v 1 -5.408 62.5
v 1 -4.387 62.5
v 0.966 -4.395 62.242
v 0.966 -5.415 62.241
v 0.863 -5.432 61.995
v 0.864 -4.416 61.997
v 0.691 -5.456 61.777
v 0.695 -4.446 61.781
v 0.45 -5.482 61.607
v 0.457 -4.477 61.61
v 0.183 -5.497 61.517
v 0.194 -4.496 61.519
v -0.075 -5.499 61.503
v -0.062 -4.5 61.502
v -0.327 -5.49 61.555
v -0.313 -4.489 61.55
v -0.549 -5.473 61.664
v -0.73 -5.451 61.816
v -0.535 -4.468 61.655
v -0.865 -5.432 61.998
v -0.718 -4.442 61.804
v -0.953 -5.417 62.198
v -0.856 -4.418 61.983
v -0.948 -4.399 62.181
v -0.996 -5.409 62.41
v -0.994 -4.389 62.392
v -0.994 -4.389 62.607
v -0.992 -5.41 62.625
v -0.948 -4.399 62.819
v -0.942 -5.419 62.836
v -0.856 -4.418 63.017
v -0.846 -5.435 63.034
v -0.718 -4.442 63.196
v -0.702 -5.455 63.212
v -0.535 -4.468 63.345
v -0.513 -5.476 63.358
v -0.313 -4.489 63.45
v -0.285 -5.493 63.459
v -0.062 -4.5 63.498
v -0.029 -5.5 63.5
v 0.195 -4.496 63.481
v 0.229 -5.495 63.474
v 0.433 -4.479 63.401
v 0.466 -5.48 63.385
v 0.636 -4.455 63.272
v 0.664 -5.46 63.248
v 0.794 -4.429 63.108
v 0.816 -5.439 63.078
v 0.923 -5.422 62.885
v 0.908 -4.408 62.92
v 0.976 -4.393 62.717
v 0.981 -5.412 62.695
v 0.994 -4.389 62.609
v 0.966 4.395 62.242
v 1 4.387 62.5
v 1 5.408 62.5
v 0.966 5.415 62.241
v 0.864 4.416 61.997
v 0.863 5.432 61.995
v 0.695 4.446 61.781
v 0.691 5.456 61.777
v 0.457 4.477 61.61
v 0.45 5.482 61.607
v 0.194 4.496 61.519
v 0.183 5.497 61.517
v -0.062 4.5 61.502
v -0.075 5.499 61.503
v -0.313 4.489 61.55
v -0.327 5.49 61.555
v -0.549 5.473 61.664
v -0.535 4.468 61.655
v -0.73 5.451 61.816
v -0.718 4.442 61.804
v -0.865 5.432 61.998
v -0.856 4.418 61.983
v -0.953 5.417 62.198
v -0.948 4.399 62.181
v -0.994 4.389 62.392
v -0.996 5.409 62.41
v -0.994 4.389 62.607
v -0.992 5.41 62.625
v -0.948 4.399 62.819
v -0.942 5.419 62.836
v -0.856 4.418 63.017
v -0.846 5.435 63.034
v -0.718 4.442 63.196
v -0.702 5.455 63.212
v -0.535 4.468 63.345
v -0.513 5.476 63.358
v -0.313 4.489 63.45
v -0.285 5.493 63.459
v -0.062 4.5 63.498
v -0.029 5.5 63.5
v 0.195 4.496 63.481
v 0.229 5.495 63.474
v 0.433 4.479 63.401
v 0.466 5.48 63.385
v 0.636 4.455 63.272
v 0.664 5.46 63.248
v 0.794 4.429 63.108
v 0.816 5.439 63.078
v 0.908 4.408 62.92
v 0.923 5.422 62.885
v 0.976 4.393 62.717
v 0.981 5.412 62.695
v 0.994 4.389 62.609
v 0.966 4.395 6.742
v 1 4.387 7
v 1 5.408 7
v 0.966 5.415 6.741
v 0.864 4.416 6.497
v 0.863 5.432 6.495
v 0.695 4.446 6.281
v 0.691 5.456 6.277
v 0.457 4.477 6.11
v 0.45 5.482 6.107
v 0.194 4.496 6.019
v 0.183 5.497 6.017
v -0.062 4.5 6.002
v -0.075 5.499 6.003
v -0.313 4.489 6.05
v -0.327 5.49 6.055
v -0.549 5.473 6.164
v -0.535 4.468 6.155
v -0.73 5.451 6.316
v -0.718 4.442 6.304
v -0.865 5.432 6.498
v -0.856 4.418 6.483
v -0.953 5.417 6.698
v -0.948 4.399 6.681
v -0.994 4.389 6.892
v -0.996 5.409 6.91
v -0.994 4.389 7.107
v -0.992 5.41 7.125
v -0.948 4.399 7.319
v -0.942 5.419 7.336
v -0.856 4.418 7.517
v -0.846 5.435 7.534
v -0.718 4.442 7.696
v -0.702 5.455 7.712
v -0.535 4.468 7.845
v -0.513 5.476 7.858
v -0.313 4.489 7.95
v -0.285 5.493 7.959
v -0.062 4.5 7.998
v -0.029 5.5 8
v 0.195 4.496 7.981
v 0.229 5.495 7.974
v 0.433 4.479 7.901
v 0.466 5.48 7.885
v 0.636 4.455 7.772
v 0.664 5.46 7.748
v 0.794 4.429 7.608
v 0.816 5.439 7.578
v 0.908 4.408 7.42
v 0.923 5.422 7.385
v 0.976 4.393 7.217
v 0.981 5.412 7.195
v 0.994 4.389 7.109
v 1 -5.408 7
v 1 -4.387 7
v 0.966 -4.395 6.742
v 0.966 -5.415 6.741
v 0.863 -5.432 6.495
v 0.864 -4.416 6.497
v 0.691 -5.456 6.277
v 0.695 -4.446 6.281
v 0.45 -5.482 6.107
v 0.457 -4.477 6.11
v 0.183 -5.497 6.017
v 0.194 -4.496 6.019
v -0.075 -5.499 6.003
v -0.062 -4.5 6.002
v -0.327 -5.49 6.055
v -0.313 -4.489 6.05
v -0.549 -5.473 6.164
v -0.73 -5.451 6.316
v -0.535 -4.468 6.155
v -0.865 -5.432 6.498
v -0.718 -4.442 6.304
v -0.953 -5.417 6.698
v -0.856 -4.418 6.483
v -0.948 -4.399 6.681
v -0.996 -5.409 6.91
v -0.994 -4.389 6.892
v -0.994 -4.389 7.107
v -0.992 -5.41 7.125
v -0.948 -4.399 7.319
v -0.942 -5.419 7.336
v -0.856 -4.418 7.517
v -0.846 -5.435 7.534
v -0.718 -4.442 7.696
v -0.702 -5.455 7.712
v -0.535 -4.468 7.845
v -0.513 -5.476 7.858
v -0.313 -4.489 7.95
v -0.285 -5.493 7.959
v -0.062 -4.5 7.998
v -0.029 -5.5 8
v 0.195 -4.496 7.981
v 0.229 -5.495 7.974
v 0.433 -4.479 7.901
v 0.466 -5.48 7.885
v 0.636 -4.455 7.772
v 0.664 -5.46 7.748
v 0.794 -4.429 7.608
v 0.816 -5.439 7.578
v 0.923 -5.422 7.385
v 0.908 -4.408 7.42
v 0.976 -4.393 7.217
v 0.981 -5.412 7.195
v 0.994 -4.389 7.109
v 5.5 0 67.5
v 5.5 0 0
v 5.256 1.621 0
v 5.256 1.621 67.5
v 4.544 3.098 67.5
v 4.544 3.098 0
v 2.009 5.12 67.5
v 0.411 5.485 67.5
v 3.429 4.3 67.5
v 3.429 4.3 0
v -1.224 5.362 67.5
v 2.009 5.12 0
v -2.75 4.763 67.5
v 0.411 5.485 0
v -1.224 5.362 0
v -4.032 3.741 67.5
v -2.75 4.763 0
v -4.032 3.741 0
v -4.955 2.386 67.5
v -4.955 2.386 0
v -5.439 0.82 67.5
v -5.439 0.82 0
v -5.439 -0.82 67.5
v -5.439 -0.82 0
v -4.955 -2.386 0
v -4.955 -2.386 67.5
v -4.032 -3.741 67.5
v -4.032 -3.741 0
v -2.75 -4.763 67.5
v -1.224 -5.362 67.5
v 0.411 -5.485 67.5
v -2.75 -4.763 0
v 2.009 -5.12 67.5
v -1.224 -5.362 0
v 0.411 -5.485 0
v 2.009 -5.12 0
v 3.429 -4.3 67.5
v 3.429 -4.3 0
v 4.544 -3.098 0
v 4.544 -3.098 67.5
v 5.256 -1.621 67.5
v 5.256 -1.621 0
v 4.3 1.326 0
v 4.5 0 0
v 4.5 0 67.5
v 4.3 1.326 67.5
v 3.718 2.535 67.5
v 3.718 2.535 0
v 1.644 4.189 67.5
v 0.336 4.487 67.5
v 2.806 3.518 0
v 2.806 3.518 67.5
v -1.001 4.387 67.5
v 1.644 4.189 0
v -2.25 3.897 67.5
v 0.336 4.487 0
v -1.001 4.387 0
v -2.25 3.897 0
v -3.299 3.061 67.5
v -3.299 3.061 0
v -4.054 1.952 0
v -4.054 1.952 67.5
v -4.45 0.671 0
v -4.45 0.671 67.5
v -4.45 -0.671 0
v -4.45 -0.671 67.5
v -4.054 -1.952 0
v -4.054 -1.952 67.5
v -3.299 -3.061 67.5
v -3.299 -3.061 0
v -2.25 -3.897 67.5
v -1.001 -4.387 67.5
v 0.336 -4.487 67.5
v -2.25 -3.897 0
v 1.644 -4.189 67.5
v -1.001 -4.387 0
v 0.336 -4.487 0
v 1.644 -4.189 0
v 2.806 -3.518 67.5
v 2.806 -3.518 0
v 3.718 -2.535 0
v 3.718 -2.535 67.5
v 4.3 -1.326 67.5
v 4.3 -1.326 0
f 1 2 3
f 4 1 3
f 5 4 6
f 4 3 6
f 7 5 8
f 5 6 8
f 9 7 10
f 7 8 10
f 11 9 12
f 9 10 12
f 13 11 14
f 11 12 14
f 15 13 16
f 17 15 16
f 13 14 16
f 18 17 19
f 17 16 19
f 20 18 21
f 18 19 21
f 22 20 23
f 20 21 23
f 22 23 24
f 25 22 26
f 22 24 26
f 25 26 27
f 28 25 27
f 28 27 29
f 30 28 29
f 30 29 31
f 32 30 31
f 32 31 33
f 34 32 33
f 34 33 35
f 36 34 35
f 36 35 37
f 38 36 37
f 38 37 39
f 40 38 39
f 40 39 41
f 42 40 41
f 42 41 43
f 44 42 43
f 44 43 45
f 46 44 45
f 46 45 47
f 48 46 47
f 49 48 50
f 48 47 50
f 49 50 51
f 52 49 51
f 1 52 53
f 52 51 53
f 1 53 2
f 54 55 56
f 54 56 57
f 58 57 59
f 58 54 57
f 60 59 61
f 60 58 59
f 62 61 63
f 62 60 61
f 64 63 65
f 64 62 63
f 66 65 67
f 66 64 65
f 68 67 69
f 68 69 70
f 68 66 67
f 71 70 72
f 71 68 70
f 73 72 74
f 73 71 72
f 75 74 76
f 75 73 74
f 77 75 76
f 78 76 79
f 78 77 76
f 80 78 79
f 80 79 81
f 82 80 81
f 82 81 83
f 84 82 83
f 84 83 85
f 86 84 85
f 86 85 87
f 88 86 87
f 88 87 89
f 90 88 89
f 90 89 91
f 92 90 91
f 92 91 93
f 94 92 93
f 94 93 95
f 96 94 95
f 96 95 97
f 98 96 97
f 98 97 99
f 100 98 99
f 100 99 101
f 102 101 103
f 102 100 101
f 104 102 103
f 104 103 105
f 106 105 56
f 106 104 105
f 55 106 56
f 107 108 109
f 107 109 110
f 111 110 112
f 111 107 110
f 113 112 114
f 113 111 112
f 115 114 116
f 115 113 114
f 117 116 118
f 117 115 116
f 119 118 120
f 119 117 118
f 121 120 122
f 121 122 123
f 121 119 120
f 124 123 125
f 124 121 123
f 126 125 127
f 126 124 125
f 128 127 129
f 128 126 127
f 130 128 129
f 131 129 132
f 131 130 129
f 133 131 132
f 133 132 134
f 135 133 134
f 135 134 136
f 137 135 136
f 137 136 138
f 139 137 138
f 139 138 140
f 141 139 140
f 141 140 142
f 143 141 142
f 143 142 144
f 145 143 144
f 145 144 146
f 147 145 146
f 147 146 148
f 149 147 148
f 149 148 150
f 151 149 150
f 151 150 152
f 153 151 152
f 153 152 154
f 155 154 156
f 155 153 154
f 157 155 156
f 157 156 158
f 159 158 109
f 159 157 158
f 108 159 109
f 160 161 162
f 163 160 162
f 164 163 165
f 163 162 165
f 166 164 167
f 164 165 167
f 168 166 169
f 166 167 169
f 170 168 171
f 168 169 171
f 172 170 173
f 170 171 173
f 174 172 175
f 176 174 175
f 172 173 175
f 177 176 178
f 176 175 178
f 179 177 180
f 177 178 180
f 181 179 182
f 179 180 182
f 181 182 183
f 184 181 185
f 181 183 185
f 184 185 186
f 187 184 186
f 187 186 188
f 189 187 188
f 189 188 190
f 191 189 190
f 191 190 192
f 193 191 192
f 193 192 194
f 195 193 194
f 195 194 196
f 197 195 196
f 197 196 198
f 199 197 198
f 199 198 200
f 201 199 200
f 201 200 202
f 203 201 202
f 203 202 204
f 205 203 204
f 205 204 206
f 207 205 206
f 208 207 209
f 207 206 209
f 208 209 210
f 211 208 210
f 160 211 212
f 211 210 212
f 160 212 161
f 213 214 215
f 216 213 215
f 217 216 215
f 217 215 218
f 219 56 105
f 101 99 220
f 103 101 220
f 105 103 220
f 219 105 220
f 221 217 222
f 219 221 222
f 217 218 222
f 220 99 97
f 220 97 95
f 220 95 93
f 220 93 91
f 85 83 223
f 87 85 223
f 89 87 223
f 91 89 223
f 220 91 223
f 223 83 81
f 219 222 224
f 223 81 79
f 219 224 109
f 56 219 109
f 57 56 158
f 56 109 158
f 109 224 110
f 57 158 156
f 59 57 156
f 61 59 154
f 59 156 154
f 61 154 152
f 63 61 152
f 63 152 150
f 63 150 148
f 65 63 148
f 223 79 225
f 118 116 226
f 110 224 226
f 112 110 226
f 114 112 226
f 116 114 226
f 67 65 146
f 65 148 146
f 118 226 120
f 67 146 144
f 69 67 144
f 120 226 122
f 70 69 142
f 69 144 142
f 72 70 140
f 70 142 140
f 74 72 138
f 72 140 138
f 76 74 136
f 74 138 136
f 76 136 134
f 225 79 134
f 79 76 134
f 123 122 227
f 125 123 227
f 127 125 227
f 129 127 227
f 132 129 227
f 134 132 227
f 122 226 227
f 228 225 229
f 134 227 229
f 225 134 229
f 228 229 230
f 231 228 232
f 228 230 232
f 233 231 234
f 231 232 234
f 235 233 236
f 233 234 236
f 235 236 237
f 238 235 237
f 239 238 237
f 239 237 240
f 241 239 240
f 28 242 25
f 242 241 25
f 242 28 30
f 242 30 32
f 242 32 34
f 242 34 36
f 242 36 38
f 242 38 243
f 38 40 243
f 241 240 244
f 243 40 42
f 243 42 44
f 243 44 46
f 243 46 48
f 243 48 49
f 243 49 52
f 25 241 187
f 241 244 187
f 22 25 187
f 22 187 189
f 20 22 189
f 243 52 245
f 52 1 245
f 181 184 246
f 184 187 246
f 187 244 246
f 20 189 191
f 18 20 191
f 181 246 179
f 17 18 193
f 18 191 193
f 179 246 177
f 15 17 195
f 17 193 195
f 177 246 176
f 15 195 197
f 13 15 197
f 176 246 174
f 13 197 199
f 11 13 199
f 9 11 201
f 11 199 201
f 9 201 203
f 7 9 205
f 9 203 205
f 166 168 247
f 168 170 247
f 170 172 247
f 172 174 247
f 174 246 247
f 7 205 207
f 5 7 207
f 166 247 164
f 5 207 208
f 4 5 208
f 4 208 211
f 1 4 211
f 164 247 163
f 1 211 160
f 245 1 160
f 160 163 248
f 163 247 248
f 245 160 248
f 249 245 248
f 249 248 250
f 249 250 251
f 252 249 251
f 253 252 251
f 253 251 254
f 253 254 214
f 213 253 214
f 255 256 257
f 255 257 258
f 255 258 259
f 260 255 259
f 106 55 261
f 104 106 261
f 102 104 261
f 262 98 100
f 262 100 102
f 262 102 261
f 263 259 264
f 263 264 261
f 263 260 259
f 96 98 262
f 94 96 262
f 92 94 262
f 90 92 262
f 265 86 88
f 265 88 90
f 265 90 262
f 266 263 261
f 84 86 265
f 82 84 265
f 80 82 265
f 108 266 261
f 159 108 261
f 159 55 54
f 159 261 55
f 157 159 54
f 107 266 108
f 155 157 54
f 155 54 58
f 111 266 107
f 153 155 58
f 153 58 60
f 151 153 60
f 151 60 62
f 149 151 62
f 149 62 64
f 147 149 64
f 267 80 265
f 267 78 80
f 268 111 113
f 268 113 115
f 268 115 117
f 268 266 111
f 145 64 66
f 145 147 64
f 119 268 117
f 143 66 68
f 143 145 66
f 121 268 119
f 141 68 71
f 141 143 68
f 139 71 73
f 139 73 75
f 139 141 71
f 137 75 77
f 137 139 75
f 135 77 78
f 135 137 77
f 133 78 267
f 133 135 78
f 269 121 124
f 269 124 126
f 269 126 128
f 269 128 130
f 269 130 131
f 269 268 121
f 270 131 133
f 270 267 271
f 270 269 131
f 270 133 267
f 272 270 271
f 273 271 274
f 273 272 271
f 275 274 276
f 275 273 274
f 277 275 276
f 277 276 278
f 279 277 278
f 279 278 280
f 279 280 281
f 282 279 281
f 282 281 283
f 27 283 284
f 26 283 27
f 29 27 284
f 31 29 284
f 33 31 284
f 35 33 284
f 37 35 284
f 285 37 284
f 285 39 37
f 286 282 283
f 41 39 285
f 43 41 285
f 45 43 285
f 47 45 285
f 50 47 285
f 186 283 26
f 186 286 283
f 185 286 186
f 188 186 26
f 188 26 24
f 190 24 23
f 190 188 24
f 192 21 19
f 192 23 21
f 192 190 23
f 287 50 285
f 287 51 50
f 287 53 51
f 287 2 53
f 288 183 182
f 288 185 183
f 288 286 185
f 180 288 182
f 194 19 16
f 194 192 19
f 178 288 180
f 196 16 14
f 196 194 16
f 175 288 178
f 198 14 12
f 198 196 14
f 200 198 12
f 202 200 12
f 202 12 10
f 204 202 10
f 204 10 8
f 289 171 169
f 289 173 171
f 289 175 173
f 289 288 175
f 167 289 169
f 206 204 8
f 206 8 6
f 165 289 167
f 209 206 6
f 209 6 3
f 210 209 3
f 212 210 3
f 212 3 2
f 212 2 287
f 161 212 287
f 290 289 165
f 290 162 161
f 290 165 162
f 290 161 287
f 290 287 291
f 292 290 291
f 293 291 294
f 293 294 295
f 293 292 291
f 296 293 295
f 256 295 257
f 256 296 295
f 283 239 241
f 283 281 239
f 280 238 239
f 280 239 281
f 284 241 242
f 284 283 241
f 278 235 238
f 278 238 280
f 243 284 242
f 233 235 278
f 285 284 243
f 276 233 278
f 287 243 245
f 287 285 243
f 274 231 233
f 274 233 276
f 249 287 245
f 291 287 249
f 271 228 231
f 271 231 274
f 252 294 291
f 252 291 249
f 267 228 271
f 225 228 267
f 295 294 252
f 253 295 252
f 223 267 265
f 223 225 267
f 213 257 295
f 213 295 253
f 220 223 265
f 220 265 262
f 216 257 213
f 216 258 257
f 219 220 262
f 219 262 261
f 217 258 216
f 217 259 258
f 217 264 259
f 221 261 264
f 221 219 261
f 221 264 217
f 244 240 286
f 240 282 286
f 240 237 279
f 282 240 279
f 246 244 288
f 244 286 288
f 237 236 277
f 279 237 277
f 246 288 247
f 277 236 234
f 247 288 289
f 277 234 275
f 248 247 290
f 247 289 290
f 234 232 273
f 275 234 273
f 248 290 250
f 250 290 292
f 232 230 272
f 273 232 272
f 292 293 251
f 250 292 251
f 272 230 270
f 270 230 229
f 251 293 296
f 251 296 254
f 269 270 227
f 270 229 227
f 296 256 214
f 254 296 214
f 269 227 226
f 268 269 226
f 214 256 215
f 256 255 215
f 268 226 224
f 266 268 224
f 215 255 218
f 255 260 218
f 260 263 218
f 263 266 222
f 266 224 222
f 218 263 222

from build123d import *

# Parameters (mm, degrees)
SKETCH1_R                  = 5.5
SKETCH1_R_2                = 4.5
BOSS_EXTRUDE1_DEPTH        = 67.5
IZIM2_R                    = 1
KES_EKSTR_ZYON1_DEPTH      = 6.5
KES_EKSTR_ZYON1_DEPTH_BACK = 6.5
IZIM3_R                    = 1
KES_EKSTR_ZYON2_DEPTH      = 6.500000118
KES_EKSTR_ZYON2_DEPTH_BACK = 6.500000118


with BuildPart() as part:
    # Sketch1 → Boss-Extrude1 (new body)
    with BuildSketch(Plane.XY):
        Circle(SKETCH1_R)
        Circle(SKETCH1_R_2, mode=Mode.SUBTRACT)
    extrude(amount=BOSS_EXTRUDE1_DEPTH)

    # Çizim2 → Kes-Ekstrüzyon1 (cut, two sides)
    with BuildSketch(Plane(origin=(0, 0, 0), x_dir=(1, 0, 0), z_dir=(0, 1, 0))) as kes_ekstr_zyon1_sk:
        with Locations((0, -7)):
            Circle(IZIM2_R)
    extrude(amount=KES_EKSTR_ZYON1_DEPTH, mode=Mode.SUBTRACT)
    extrude(kes_ekstr_zyon1_sk.sketch, amount=-KES_EKSTR_ZYON1_DEPTH_BACK, mode=Mode.SUBTRACT)

    # Çizim3 → Kes-Ekstrüzyon2 (cut, two sides)
    with BuildSketch(Plane(origin=(0, 0, 0), x_dir=(1, 0, 0), z_dir=(0, 1, 0))) as kes_ekstr_zyon2_sk:
        with Locations((0, -62.5)):
            Circle(IZIM3_R)
    extrude(amount=KES_EKSTR_ZYON2_DEPTH, mode=Mode.SUBTRACT)
    extrude(kes_ekstr_zyon2_sk.sketch, amount=-KES_EKSTR_ZYON2_DEPTH_BACK, mode=Mode.SUBTRACT)


solid = part.part
